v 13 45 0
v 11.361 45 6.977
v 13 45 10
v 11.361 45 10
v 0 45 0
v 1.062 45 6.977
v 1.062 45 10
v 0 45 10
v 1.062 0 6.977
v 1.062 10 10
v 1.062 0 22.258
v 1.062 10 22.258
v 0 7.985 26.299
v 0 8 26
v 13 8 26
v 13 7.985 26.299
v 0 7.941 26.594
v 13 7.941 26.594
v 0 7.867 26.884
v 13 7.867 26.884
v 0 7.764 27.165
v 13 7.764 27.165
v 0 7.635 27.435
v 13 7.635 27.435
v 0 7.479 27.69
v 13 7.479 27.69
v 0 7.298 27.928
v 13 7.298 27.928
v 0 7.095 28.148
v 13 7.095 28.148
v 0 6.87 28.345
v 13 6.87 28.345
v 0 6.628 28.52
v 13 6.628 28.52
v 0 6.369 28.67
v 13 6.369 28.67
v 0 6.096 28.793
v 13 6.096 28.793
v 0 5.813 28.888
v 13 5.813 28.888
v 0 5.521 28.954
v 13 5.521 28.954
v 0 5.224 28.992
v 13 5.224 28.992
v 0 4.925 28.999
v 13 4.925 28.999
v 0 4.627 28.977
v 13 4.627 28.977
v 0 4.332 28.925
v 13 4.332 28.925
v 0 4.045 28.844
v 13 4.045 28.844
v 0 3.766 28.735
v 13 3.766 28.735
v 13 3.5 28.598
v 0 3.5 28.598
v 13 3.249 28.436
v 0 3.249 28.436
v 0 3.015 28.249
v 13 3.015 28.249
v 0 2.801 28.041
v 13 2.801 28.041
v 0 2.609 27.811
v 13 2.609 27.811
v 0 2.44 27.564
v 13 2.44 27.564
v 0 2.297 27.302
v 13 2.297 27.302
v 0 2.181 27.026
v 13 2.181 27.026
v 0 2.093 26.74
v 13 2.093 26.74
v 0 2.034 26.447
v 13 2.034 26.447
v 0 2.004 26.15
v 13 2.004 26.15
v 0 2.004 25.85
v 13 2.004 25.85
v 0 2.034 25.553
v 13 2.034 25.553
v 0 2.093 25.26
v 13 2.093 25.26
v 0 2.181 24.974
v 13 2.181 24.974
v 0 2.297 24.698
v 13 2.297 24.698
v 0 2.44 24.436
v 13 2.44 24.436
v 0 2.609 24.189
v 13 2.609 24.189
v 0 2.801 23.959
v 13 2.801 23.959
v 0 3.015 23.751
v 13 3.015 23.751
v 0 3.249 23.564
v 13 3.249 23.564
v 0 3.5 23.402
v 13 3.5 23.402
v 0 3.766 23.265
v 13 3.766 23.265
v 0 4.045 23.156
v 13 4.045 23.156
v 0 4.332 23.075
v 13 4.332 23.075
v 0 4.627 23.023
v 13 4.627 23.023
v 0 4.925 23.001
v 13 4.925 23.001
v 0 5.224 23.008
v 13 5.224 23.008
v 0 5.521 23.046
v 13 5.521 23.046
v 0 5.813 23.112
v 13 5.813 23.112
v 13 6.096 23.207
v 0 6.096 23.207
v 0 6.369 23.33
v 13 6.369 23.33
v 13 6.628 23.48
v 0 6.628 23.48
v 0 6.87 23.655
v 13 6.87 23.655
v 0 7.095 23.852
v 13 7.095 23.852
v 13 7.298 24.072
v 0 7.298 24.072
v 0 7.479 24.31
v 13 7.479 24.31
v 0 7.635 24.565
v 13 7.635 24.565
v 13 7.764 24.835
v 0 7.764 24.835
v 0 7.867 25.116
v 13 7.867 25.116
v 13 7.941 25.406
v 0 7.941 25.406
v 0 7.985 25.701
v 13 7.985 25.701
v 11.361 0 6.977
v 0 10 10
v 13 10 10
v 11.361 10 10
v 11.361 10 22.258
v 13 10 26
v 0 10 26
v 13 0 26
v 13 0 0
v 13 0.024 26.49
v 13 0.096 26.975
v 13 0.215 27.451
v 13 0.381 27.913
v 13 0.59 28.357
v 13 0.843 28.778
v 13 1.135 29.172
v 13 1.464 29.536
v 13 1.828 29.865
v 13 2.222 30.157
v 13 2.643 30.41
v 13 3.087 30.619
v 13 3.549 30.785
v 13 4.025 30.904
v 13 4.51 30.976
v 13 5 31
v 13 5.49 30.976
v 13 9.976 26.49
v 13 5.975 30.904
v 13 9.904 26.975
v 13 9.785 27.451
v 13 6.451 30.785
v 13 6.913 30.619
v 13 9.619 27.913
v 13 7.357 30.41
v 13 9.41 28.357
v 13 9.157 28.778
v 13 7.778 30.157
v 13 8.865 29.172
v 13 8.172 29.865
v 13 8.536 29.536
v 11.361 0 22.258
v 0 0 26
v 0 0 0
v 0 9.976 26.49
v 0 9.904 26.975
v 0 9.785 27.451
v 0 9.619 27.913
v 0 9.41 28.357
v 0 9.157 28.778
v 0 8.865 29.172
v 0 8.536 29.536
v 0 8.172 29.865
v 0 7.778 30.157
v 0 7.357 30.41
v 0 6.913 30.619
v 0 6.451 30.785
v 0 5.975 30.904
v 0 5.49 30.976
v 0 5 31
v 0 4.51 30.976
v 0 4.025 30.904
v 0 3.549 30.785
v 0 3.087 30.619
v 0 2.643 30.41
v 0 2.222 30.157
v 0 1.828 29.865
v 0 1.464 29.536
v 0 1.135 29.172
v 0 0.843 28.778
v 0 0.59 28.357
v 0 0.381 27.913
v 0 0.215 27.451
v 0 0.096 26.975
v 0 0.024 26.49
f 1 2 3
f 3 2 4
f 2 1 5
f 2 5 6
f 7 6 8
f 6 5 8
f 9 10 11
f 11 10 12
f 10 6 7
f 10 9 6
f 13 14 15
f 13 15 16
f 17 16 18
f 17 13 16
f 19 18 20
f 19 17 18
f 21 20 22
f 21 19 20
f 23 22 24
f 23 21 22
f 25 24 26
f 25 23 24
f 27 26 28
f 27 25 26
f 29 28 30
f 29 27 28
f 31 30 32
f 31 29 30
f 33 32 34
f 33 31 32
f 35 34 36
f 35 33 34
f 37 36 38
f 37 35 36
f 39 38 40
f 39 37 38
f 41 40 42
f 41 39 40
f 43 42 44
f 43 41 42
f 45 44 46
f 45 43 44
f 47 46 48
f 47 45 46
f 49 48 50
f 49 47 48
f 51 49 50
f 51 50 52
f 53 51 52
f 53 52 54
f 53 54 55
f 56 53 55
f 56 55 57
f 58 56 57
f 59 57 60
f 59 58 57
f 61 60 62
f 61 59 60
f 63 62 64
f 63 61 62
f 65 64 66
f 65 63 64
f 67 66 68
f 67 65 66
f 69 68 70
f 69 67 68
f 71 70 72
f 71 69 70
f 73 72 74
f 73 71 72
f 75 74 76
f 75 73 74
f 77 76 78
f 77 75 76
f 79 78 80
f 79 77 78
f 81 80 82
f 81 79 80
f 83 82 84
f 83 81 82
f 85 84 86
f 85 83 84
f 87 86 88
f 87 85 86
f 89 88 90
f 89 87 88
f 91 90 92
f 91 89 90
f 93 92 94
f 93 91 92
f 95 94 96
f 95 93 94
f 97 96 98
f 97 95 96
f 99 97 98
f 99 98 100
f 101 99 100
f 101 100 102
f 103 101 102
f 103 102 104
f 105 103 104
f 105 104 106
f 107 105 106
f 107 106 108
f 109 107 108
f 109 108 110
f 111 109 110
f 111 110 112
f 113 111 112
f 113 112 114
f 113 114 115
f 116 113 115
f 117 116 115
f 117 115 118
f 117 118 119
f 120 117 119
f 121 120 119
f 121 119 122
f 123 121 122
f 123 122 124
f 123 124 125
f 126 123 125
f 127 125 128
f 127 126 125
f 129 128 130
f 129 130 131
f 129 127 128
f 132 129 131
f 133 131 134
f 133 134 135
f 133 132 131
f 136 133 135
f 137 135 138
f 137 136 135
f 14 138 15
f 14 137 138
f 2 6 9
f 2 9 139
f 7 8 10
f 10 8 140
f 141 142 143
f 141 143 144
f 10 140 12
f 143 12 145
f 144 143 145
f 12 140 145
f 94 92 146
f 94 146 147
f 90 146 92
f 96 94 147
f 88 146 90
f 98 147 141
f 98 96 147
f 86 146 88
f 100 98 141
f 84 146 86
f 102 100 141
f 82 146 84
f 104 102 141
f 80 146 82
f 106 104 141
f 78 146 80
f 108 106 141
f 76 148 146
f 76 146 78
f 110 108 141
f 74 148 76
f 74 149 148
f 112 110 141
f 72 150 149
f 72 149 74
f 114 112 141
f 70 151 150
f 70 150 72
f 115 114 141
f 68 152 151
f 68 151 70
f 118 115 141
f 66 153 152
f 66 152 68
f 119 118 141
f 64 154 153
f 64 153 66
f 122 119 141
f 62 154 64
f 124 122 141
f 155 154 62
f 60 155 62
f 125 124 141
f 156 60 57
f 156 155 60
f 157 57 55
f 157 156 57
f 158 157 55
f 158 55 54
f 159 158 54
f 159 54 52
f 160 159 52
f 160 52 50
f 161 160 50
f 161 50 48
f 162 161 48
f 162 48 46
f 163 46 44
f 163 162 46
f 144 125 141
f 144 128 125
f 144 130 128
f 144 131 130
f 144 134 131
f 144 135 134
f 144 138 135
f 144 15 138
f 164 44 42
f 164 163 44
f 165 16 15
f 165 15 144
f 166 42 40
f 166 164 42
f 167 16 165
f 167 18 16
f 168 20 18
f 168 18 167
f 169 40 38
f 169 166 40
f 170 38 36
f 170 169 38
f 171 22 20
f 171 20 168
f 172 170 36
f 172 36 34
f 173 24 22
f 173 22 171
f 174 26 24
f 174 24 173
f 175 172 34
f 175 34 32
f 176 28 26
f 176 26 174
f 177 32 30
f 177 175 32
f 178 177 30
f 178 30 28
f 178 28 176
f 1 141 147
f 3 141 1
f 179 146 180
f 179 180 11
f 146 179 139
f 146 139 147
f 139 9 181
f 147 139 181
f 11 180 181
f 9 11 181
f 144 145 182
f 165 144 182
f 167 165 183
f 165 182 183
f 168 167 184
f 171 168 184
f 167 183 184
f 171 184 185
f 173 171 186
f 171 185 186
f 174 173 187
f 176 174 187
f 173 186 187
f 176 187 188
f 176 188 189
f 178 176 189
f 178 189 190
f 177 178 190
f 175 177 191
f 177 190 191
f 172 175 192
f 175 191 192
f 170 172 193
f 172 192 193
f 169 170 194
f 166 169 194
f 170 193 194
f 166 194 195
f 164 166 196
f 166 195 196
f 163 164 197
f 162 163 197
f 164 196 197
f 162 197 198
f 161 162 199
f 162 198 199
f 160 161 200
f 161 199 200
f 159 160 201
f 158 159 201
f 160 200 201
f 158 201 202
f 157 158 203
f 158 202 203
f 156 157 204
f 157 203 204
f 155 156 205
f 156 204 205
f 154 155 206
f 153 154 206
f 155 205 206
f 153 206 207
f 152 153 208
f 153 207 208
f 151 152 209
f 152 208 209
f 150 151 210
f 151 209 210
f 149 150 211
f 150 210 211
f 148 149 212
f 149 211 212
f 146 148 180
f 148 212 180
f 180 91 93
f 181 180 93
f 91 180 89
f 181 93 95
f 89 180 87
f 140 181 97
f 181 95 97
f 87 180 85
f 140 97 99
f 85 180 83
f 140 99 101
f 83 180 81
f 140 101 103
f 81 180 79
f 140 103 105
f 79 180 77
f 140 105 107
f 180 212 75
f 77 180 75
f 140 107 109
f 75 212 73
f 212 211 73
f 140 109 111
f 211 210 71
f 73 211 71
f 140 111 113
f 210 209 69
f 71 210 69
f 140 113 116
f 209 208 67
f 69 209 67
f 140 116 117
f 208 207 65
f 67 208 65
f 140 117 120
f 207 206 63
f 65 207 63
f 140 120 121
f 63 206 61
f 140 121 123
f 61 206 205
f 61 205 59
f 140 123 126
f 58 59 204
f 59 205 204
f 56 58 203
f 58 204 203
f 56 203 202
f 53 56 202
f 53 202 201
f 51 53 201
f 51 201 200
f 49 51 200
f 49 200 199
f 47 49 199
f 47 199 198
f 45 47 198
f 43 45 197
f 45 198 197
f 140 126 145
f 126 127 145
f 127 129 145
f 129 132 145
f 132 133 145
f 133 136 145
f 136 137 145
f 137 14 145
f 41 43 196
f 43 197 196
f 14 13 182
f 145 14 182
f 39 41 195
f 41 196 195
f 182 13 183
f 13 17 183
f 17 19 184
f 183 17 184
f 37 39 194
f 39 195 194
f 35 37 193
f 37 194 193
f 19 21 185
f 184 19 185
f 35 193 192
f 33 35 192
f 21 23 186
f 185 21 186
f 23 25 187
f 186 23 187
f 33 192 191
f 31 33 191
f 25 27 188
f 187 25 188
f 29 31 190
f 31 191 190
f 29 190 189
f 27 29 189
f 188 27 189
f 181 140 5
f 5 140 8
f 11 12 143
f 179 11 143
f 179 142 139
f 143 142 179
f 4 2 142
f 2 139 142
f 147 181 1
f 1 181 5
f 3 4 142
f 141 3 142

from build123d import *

# Parameters (mm, degrees)
SKETCH_R     = 3
PAD_DEPTH    = 13
SKETCH001_W  = 15.280671
SKETCH001_H  = 10.299273
POCKET_DEPTH = 46


with BuildPart() as part:
    # Sketch → Pad (new body)
    with BuildSketch(Plane.YZ):
        with BuildLine():
            Line((0, 0), (45, 0))
            Line((45, 0), (45, 10))
            Line((45, 10), (20, 10))
            Line((20, 10), (10, 10))
            Line((10, 10), (10, 26))
            ThreePointArc((10, 26), (5, 31), (0, 26))
            Line((0, 26), (0, 0))
        make_face()
        with Locations((5, 26)):
            Circle(SKETCH_R, mode=Mode.SUBTRACT)
    extrude(amount=PAD_DEPTH)

    # Sketch001 (on DatumPlane) → Pocket (cut)
    with BuildSketch(Plane.ZX.offset(45)):
        with Locations((14.617652, 6.211655)):
            Rectangle(SKETCH001_W, SKETCH001_H)
    extrude(amount=-POCKET_DEPTH, mode=Mode.SUBTRACT)


solid = part.part
